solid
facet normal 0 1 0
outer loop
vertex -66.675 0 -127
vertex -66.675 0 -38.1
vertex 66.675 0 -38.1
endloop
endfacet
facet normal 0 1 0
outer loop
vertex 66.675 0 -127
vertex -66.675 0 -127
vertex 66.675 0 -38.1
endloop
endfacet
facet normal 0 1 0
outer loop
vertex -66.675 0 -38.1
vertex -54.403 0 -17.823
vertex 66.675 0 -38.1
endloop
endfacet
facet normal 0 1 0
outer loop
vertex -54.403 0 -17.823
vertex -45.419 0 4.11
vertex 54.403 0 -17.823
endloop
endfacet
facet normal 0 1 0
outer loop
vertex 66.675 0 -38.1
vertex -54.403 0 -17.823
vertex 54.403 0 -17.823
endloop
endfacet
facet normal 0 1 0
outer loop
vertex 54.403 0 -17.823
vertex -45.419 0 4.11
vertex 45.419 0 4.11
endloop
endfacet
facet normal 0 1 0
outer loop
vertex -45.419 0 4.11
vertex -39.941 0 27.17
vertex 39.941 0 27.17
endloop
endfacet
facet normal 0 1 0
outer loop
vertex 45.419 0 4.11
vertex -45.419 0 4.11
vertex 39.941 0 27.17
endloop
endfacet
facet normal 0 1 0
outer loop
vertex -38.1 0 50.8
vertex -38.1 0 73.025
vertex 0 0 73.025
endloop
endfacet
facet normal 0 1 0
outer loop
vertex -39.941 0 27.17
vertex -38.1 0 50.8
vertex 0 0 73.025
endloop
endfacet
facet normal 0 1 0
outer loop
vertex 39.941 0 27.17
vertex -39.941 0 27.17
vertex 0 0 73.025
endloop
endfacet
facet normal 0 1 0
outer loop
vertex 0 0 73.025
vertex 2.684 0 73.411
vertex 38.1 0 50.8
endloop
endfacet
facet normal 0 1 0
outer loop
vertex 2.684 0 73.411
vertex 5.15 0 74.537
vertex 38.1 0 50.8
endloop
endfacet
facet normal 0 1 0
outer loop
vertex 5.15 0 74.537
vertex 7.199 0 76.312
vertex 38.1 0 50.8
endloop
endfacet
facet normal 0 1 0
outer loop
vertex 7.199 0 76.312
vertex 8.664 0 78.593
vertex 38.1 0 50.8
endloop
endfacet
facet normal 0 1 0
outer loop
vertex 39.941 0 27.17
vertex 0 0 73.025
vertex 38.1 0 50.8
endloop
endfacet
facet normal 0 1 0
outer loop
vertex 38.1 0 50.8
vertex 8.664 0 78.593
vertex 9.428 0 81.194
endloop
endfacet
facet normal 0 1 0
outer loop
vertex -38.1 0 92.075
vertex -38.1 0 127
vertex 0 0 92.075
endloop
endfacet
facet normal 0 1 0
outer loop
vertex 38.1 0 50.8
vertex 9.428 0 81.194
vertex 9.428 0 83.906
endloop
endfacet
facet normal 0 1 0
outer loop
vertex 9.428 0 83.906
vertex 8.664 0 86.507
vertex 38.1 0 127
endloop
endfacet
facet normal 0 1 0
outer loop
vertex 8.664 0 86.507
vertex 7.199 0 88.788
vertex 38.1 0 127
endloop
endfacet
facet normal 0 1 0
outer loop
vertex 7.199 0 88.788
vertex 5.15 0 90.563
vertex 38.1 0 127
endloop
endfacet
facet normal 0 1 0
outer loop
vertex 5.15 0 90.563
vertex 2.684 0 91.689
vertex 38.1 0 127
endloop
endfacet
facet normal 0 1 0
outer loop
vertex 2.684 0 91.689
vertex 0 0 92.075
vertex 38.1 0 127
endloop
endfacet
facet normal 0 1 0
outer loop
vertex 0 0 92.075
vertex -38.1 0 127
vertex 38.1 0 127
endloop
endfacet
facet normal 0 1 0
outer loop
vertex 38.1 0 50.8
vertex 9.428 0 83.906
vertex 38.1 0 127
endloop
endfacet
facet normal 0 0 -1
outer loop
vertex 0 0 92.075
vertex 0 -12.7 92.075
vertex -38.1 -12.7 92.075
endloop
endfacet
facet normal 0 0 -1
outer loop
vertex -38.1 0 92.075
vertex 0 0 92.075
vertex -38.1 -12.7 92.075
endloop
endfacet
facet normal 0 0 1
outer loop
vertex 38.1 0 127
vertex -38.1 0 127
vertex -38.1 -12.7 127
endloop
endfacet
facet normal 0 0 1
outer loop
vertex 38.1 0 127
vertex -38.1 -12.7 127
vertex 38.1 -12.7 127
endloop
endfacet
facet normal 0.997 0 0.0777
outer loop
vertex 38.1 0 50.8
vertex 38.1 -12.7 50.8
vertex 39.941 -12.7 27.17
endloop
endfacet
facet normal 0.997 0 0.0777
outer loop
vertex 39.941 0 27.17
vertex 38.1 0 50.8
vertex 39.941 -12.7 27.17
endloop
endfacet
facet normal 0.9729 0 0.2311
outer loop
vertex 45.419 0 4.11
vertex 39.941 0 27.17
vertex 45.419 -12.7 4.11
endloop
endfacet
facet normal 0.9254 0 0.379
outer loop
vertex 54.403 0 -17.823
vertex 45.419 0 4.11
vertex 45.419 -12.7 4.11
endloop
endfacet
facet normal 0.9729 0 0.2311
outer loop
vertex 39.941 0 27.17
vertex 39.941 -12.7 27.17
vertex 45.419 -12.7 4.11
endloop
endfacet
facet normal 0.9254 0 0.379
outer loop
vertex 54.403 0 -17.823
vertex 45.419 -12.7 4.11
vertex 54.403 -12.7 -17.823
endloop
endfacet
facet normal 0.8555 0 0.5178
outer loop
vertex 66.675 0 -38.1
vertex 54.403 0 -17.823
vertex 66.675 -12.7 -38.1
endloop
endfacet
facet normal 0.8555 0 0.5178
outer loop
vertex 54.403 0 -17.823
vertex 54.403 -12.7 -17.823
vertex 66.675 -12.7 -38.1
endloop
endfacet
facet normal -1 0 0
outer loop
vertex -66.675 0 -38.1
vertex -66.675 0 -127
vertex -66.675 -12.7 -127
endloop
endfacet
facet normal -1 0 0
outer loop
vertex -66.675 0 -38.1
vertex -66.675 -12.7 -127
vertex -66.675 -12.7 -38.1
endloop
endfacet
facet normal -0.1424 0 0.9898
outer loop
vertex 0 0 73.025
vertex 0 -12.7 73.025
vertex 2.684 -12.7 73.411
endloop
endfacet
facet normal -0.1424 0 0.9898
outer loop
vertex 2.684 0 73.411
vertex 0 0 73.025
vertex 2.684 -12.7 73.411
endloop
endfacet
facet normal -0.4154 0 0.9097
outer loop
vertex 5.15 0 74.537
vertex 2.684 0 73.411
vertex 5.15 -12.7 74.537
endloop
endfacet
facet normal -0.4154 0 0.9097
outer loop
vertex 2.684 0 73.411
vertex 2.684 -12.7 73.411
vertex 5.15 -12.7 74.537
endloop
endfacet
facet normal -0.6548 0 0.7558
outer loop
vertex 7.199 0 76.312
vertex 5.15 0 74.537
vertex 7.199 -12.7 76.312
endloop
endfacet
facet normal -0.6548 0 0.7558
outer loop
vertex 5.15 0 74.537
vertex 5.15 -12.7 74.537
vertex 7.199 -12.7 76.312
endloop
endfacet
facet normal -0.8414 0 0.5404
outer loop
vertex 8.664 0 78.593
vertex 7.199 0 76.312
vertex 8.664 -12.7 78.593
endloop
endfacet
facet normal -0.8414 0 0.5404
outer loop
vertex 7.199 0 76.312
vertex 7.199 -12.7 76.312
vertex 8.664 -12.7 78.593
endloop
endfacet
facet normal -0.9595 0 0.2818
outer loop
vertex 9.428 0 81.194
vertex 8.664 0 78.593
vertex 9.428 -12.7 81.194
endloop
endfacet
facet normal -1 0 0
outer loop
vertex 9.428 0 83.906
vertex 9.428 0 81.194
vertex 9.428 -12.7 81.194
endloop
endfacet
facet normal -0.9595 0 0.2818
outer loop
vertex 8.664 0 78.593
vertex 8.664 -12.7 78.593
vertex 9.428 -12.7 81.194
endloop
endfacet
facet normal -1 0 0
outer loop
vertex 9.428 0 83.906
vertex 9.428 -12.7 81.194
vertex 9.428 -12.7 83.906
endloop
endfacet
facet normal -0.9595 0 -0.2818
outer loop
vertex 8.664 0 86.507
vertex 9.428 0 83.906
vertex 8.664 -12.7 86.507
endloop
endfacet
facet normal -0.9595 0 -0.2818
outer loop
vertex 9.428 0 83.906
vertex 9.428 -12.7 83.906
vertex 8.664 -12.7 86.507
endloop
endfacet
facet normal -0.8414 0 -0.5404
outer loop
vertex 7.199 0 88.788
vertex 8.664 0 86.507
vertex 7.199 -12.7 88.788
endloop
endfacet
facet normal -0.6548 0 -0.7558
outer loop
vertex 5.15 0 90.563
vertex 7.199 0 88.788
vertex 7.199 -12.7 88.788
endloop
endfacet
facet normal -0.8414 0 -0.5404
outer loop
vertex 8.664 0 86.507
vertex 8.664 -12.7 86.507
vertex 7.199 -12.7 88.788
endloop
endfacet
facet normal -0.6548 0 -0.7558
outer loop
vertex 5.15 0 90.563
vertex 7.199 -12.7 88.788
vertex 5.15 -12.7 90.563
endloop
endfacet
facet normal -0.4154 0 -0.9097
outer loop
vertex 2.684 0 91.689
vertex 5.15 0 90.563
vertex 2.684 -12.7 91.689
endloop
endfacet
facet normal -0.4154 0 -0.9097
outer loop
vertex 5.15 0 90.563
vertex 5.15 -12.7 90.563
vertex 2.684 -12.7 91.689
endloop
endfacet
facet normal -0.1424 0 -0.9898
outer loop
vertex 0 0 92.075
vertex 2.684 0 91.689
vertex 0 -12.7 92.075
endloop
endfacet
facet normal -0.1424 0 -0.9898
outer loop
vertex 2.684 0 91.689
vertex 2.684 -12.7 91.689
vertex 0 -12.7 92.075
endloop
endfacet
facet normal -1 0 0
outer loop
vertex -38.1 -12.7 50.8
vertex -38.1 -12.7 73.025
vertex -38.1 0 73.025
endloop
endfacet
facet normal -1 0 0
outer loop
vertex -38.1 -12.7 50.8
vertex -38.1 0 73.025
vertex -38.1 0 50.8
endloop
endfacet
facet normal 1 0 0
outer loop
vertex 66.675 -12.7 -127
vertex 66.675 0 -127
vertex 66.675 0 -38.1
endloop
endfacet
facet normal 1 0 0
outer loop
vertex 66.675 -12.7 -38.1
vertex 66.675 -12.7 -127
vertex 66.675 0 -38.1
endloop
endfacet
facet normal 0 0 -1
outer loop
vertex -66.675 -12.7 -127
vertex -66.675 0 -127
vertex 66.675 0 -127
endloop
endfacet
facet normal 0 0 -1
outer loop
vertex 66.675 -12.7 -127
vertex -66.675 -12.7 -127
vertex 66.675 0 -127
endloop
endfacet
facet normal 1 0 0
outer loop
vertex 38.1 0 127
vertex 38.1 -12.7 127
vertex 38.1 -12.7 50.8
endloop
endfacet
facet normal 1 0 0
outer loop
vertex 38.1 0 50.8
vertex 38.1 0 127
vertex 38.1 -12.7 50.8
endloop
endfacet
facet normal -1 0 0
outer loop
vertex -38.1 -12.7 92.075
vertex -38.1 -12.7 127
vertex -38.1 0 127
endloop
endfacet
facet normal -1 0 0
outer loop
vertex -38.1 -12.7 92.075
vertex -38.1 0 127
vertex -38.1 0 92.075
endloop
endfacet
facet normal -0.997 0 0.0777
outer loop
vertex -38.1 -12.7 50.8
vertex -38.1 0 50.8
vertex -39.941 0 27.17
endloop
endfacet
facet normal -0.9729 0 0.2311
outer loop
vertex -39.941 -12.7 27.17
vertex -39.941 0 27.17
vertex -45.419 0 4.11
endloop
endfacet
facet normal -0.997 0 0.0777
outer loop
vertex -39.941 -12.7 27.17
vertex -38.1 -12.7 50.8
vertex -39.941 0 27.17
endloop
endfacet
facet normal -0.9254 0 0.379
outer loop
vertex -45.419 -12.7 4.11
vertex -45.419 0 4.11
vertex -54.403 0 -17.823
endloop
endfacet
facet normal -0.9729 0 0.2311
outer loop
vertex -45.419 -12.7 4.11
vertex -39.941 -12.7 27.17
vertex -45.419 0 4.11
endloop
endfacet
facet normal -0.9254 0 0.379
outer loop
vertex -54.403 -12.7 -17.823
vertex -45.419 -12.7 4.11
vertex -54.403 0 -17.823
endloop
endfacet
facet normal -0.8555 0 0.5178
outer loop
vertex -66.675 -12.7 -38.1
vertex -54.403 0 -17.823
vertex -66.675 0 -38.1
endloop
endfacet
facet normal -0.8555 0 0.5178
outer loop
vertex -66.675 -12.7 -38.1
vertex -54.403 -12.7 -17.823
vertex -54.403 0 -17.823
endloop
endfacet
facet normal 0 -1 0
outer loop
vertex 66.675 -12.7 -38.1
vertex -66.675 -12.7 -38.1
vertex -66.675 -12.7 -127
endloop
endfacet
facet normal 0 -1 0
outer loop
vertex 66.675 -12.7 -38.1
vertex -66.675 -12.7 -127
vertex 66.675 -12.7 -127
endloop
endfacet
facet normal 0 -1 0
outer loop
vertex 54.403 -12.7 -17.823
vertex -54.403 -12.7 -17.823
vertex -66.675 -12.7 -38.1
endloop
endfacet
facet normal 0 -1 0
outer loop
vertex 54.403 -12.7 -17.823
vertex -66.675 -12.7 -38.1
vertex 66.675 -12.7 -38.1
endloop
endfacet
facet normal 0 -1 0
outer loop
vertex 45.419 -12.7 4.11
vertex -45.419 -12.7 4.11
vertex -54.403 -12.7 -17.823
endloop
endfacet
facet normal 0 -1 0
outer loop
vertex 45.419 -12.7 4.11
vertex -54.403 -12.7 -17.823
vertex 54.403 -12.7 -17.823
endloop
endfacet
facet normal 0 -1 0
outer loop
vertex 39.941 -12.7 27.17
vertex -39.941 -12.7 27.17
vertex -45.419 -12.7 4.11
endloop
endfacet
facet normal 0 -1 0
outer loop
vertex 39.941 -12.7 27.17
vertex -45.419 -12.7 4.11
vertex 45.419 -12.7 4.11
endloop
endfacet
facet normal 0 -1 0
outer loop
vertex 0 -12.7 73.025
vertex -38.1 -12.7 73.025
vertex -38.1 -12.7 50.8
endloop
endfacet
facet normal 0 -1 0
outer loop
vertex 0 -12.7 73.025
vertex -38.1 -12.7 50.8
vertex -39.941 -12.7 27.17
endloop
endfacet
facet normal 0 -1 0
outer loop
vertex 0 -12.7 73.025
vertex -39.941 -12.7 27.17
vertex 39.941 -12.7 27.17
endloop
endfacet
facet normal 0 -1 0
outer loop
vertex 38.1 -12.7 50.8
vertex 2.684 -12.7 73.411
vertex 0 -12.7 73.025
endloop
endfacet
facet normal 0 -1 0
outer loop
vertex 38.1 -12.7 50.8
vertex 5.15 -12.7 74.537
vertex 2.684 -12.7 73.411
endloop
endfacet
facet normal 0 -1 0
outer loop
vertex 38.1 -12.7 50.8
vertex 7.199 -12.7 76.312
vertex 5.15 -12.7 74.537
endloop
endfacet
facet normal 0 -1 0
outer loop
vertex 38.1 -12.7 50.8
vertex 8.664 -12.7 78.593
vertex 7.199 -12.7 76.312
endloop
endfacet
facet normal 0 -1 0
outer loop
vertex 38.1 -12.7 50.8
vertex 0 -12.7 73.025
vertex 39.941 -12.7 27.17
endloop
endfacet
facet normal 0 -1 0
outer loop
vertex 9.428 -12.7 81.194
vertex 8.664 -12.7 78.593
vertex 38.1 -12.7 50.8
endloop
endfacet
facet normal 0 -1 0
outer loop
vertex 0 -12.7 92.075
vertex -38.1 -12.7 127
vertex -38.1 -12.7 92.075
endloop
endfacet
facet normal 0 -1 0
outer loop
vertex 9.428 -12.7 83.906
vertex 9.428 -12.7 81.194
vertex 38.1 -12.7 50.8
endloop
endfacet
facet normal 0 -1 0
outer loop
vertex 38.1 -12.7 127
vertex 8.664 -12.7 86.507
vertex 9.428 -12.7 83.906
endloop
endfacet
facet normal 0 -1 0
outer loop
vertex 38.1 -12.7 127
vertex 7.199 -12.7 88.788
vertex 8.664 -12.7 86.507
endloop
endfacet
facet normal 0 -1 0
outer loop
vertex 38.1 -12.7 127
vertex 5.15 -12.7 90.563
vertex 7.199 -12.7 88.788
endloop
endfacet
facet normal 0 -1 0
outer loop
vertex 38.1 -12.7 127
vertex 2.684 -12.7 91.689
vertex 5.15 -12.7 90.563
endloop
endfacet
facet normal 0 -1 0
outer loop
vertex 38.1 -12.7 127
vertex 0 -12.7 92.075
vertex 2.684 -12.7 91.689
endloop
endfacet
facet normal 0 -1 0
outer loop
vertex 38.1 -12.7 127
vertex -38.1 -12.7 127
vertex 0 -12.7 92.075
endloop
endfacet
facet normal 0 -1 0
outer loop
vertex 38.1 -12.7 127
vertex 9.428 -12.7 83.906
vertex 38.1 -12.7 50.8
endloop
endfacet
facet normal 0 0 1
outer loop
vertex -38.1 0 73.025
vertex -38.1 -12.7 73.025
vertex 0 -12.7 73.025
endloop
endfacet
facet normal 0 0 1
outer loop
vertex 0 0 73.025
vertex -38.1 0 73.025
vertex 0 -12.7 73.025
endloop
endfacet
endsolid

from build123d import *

# Parameters (mm, degrees)
F0_W     = 133.35
F0_H     = 254
F1_DEPTH = 12.7
F3_DEPTH = 294
F5_DEPTH = 12.701


# Not quite as in the source:
# - an extrude ends at something that could not be found from the text; its depth is read off the source's solid
# - a pattern or mirror of a feature is missing from the dataset's text; its kind, count and spacing are read off the source's solid


with BuildPart() as f1:
    # F0 (on Front) → F1 (new body)
    with BuildSketch(Plane.XZ):
        Rectangle(F0_W, F0_H)
    extrude(amount=F1_DEPTH)

    # F0 (on Front) + F2 (on face) → F3 (cut, through all)
    with BuildSketch(Plane.XZ):
        Rectangle(F0_W, F0_H)
    with BuildSketch(Plane.XZ.offset(12.7)):
        with BuildLine():
            Line((-66.675, 73.025), (0, 73.025))
            ThreePointArc((0, 73.025), (9.525, 82.55), (0, 92.075))
            Line((0, 92.075), (-66.675, 92.075))
            Line((-66.675, 92.075), (-66.675, 73.025))
        make_face()
    extrude(amount=-F3_DEPTH, mode=Mode.SUBTRACT)

    # F4 (on face) → F5 (cut, through all)
    with BuildSketch(Plane.XZ.offset(12.7)):
        with BuildLine():
            Line((66.675, 127), (38.1, 127))
            Line((38.1, 127), (38.1, 50.8))
            ThreePointArc((38.1, 50.8), (45.4193088889, 4.1102242857), (66.675, -38.1))
            Line((66.675, -38.1), (66.675, 127))
        make_face()
    f5 = extrude(amount=-F5_DEPTH, mode=Mode.SUBTRACT)

    # F5_copies: F5 across plane
    add(f5.mirror(Plane(origin=(0, 0, 0), x_dir=(0, 0, -1), z_dir=(-1, 0, 0))), mode=Mode.SUBTRACT)


solid = f1.part
